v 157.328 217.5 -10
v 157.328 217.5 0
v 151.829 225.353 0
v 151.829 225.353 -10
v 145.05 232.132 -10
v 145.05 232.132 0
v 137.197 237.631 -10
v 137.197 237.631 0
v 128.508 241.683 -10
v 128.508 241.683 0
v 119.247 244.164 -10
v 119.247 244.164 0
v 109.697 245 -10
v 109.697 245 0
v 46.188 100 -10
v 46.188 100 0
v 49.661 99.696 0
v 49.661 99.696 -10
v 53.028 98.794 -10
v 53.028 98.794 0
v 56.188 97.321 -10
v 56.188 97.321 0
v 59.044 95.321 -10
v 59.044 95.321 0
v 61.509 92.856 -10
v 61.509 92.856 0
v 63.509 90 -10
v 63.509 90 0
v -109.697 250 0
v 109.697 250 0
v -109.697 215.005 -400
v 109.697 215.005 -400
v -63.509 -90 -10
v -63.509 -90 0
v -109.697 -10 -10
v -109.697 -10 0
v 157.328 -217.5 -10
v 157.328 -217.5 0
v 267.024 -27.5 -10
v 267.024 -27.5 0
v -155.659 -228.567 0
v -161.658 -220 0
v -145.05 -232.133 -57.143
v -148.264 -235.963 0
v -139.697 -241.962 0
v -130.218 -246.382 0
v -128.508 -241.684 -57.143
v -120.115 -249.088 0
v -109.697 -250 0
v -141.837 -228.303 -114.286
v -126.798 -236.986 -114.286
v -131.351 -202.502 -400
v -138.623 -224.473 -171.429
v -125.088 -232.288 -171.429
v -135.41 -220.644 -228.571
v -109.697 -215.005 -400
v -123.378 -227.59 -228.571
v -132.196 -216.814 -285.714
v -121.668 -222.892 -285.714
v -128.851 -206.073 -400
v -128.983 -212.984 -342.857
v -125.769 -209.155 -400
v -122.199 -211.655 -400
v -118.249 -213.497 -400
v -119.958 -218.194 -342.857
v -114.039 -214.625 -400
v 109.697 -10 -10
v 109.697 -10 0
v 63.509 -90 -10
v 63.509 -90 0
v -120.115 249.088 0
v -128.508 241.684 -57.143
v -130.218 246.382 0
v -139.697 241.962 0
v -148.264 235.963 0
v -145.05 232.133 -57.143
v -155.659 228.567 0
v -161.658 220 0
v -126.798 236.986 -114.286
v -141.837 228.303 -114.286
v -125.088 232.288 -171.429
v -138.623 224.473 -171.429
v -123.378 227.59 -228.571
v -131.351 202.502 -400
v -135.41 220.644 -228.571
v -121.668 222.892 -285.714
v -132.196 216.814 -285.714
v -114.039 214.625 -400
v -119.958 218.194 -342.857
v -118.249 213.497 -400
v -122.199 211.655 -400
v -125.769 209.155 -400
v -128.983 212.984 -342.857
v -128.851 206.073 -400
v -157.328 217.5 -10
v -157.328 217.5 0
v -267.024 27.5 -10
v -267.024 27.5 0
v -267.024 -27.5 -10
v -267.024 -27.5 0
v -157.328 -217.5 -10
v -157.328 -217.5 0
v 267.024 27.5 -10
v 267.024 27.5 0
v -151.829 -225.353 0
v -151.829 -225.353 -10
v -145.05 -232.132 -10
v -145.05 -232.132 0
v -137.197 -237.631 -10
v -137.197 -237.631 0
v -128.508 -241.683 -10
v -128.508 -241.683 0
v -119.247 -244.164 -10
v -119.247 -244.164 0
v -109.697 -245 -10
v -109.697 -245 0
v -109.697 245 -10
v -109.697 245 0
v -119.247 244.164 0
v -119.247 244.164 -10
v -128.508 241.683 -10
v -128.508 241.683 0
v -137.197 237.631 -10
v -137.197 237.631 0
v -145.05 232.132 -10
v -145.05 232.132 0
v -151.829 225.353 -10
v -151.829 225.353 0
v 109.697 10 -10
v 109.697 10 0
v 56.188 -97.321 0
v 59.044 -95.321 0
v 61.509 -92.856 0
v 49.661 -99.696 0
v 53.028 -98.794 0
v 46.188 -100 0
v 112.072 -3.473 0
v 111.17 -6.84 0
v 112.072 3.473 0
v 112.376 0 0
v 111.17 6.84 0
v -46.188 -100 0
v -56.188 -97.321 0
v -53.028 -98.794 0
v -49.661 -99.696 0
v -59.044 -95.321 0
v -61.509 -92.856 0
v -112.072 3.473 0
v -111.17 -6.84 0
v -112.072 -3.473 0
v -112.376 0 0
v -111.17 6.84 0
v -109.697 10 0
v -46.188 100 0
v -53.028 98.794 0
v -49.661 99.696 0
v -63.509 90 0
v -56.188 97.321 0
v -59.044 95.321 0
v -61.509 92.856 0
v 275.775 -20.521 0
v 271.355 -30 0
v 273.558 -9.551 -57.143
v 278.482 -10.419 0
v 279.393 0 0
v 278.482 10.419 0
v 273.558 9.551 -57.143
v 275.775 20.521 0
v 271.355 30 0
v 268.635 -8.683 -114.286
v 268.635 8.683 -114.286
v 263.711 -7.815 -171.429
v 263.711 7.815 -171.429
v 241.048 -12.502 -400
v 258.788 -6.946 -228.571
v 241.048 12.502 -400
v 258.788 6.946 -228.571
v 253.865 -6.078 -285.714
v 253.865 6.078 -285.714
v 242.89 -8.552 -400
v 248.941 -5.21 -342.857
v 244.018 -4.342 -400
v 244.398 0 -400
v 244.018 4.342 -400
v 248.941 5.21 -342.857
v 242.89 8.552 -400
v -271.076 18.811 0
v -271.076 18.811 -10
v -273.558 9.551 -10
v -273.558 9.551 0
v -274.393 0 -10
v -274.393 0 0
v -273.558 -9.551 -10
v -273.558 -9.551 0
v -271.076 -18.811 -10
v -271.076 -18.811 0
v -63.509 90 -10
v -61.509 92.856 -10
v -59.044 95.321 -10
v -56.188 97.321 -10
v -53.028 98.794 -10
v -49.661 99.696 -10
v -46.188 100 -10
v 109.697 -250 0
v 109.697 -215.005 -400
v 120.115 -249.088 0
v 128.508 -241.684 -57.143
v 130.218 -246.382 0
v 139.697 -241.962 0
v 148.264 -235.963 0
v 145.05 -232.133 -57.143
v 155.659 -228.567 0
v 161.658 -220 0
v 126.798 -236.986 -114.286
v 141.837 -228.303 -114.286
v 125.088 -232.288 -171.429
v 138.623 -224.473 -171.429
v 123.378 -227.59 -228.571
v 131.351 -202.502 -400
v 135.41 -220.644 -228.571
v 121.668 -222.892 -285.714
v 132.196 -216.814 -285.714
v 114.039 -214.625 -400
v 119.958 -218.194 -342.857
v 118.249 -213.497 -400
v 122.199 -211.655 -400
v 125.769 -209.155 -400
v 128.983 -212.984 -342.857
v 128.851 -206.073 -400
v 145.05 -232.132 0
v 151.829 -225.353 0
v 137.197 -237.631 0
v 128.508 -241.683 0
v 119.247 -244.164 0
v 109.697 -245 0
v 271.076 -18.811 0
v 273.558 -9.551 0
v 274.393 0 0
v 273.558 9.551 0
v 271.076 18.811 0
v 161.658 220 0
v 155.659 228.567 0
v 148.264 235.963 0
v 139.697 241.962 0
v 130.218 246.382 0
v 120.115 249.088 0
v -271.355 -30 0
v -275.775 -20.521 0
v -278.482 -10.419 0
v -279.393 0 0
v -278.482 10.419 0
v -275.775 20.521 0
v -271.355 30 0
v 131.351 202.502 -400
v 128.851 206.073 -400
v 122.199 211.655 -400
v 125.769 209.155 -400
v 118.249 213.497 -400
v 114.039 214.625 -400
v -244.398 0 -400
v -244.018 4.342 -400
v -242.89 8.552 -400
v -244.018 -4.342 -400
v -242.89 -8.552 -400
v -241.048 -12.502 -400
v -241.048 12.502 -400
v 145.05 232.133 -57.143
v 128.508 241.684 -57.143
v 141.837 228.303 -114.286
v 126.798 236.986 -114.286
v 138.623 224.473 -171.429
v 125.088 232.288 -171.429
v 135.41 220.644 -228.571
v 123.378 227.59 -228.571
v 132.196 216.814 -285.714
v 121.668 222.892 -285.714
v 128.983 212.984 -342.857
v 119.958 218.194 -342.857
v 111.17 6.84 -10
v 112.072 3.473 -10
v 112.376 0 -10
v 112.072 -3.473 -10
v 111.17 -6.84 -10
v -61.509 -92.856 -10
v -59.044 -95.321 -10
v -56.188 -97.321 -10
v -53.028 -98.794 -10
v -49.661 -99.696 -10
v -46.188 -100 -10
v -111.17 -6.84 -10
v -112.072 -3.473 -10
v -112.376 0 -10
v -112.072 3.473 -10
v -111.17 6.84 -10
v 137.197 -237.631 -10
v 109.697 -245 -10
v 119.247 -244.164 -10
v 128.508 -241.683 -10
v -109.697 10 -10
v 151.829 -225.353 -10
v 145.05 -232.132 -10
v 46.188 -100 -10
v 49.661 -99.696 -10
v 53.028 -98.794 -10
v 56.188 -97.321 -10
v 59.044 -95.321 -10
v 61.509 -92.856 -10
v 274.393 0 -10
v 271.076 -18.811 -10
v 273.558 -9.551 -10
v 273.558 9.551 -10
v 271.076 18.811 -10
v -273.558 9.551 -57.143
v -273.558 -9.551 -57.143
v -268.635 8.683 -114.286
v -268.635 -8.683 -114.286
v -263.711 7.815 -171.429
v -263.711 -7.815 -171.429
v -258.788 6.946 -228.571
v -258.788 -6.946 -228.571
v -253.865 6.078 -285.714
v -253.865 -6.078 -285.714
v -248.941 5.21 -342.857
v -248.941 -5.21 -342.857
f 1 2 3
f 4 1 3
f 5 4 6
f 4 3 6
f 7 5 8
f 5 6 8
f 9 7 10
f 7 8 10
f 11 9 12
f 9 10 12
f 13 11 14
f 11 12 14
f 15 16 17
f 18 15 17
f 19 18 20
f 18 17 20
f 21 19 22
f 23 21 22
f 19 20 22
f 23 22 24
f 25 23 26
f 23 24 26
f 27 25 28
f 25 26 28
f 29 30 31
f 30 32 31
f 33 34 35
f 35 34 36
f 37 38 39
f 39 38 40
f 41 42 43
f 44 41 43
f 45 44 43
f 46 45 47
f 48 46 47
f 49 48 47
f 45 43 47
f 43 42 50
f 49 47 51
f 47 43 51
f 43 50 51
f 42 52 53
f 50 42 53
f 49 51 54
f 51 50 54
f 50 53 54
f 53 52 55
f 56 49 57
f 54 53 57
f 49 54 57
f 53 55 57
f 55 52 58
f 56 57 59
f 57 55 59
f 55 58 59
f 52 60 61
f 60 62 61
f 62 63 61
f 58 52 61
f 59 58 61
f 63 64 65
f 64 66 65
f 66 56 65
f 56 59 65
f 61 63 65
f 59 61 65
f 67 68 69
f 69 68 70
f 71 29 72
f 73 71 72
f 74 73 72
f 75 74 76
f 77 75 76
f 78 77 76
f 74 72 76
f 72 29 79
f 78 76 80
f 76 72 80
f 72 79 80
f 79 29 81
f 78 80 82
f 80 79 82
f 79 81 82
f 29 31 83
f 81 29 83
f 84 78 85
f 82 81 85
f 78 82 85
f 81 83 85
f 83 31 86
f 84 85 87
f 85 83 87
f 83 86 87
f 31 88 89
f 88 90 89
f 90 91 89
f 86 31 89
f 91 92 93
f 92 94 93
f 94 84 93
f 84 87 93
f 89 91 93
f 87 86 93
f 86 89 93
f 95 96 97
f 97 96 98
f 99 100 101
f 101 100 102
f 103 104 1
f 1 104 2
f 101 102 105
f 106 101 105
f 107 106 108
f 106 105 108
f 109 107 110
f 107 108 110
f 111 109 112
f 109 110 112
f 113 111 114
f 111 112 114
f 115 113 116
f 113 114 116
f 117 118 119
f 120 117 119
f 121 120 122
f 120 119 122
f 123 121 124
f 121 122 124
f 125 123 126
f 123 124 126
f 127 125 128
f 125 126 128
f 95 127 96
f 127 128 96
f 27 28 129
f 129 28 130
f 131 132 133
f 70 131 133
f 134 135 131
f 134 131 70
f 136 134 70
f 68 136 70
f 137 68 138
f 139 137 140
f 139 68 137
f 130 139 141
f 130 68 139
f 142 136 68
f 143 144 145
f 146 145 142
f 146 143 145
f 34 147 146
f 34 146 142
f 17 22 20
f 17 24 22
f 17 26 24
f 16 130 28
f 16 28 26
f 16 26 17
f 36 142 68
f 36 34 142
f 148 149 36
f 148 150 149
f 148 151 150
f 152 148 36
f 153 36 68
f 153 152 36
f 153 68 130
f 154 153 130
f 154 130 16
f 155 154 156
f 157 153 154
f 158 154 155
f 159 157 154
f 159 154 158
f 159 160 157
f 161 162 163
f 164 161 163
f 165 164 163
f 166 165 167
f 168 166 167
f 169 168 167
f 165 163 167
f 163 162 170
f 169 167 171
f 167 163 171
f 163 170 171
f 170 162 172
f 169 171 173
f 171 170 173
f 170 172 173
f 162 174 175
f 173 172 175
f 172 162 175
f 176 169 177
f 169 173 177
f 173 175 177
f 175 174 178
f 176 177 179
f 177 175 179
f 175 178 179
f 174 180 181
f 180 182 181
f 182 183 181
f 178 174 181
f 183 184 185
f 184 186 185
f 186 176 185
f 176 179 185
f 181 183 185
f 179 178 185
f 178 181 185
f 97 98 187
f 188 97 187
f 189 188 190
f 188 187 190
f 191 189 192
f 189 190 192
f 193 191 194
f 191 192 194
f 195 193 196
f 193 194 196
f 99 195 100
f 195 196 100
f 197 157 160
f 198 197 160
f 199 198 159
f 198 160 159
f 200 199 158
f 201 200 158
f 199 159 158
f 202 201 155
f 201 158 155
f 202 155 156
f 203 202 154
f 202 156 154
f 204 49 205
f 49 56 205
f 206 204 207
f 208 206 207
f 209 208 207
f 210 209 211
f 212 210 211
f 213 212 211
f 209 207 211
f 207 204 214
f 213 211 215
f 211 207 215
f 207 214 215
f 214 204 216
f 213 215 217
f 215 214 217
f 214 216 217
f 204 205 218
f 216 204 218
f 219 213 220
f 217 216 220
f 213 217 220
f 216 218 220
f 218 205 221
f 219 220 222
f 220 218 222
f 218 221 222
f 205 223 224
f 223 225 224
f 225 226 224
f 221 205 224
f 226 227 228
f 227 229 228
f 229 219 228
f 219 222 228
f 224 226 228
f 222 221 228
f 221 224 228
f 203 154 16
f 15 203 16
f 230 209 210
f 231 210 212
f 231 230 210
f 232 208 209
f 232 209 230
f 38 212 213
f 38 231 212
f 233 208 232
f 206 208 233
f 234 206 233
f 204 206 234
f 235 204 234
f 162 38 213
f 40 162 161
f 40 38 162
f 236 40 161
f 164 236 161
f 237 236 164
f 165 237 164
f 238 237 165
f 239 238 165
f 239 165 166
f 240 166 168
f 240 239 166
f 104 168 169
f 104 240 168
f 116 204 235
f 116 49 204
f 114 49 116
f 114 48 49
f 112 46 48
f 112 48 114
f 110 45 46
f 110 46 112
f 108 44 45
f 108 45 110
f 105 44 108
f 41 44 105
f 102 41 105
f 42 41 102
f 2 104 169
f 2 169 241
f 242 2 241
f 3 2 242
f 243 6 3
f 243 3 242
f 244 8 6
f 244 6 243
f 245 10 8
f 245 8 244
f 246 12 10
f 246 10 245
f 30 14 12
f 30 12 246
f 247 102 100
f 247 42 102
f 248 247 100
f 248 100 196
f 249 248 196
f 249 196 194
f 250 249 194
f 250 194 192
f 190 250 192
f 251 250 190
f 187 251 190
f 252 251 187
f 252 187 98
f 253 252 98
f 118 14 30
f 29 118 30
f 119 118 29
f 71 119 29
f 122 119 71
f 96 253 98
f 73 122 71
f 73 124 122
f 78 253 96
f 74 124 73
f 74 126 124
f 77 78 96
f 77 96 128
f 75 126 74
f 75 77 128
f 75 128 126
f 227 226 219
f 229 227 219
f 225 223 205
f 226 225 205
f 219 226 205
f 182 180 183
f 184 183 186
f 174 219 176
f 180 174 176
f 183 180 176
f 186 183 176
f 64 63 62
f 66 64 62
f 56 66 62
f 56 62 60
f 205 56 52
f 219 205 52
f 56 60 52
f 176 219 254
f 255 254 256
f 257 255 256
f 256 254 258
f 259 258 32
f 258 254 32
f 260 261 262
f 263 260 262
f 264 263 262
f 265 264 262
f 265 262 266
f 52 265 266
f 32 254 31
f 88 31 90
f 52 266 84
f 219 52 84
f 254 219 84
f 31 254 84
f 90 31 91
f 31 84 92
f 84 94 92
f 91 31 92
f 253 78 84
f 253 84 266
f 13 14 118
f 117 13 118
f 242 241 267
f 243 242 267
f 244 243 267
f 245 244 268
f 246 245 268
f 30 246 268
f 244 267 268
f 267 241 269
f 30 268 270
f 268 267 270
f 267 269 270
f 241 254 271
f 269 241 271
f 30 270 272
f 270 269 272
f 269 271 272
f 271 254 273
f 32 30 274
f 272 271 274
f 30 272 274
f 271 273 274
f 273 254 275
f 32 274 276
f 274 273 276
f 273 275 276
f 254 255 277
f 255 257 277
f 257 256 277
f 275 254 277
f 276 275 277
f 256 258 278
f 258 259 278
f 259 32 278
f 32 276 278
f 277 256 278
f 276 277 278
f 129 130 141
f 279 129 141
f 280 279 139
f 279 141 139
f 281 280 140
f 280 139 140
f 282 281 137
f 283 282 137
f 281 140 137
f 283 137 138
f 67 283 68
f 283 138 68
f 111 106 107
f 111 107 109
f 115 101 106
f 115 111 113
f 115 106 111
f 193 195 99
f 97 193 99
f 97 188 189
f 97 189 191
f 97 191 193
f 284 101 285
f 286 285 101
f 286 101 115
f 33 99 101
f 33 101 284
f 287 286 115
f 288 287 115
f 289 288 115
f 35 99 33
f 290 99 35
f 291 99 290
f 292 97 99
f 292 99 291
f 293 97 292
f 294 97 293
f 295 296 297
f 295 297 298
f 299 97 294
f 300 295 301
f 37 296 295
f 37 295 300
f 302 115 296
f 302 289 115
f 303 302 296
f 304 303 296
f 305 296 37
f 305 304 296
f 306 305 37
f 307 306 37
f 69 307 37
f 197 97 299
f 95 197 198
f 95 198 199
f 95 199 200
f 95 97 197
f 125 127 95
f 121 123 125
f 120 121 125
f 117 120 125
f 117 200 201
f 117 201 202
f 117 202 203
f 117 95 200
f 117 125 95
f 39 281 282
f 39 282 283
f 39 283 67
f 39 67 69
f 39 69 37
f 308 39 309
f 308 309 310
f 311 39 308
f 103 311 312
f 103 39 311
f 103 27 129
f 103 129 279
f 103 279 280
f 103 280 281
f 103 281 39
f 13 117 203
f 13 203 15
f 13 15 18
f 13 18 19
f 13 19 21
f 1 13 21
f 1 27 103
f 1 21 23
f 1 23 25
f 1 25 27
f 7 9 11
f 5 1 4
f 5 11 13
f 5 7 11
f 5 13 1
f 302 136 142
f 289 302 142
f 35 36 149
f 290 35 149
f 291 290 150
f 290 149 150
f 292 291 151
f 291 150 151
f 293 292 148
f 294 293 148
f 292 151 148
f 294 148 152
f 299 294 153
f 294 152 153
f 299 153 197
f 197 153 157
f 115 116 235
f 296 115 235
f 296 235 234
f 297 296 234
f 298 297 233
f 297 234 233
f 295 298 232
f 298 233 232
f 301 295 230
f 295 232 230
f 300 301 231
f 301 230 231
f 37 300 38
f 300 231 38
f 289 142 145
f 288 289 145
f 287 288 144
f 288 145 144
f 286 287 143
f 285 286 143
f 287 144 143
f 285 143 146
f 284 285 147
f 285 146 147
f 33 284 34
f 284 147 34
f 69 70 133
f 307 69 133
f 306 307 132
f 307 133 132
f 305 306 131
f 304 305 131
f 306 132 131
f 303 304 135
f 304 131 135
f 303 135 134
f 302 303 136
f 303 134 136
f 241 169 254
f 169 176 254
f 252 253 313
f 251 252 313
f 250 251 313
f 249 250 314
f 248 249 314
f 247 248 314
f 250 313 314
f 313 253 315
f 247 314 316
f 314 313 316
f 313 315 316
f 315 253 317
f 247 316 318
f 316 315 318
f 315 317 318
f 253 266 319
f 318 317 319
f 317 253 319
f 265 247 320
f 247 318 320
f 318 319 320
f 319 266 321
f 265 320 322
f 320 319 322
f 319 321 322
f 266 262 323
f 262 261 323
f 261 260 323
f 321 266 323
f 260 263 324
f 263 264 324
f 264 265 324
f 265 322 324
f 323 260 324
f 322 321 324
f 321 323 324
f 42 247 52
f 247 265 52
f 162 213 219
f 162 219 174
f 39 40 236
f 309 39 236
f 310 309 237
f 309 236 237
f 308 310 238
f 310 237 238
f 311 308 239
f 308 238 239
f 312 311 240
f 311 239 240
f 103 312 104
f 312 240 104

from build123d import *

# Parameters (mm, degrees)
F1_DEPTH = 400
F1_TAPER = 5
F2_DEPTH = 10


with BuildPart() as f1:
    # F0 (on Top) → F1 (new body)
    with BuildSketch(Plane.XY):
        with BuildLine():
            Line((109.696551146, 250), (-109.696551146, 250))
            ThreePointArc((-109.696551146, 250), (-139.696551146, 241.9615242271), (-161.6580753731, 220))
            Line((-161.6580753731, 220), (-271.3546265191, 30))
            ThreePointArc((-271.3546265191, 30), (-279.3931022921, 0), (-271.3546265191, -30))
            Line((-271.3546265191, -30), (-161.6580753731, -220))
            ThreePointArc((-161.6580753731, -220), (-139.696551146, -241.9615242271), (-109.696551146, -250))
            Line((-109.696551146, -250), (109.696551146, -250))
            ThreePointArc((109.696551146, -250), (139.696551146, -241.9615242271), (161.6580753731, -220))
            Line((161.6580753731, -220), (271.3546265191, -30))
            ThreePointArc((271.3546265191, -30), (279.3931022921, 0), (271.3546265191, 30))
            Line((271.3546265191, 30), (161.6580753731, 220))
            ThreePointArc((161.6580753731, 220), (139.696551146, 241.9615242271), (109.696551146, 250))
        make_face()
        with BuildLine():
            ThreePointArc((-109.696551146, -244.9999966036), (-137.1965494478, -237.6313942668), (-157.3279454128, -217.4999983018))
            Line((-157.3279454128, -217.4999983018), (-267.0244965589, -27.4999983018))
            ThreePointArc((-267.0244965589, -27.4999983018), (-274.3930988957, 0), (-267.0244965589, 27.4999983018))
            Line((-267.0244965589, 27.4999983018), (-157.3279454128, 217.4999983018))
            ThreePointArc((-157.3279454128, 217.4999983018), (-137.1965494478, 237.6313942668), (-109.696551146, 244.9999966036))
            Line((-109.696551146, 244.9999966036), (109.696551146, 244.9999966036))
            ThreePointArc((109.696551146, 244.9999966036), (137.1965494478, 237.6313942668), (157.3279454128, 217.4999983018))
            Line((157.3279454128, 217.4999983018), (267.0244965589, 27.4999983018))
            ThreePointArc((267.0244965589, 27.4999983018), (274.3930988957, 0), (267.0244965589, -27.4999983018))
            Line((267.0244965589, -27.4999983018), (157.3279454128, -217.4999983018))
            ThreePointArc((157.3279454128, -217.4999983018), (137.1965494478, -237.6313942668), (109.696551146, -244.9999966036))
            Line((109.696551146, -244.9999966036), (-109.696551146, -244.9999966036))
        make_face(mode=Mode.SUBTRACT)
        with BuildLine():
            Line((-267.0244965589, -27.4999983018), (-157.3279454128, -217.4999983018))
            ThreePointArc((-157.3279454128, -217.4999983018), (-137.1965494478, -237.6313942668), (-109.696551146, -244.9999966036))
            Line((-109.696551146, -244.9999966036), (109.696551146, -244.9999966036))
            ThreePointArc((109.696551146, -244.9999966036), (137.1965494478, -237.6313942668), (157.3279454128, -217.4999983018))
            Line((157.3279454128, -217.4999983018), (267.0244965589, -27.4999983018))
            ThreePointArc((267.0244965589, -27.4999983018), (274.3930988957, 0), (267.0244965589, 27.4999983018))
            Line((267.0244965589, 27.4999983018), (157.3279454128, 217.4999983018))
            ThreePointArc((157.3279454128, 217.4999983018), (137.1965494478, 237.6313942668), (109.696551146, 244.9999966036))
            Line((109.696551146, 244.9999966036), (-109.696551146, 244.9999966036))
            ThreePointArc((-109.696551146, 244.9999966036), (-137.1965494478, 237.6313942668), (-157.3279454128, 217.4999983018))
            Line((-157.3279454128, 217.4999983018), (-267.0244965589, 27.4999983018))
            ThreePointArc((-267.0244965589, 27.4999983018), (-274.3930988957, 0), (-267.0244965589, -27.4999983018))
        make_face()
        with BuildLine():
            ThreePointArc((-63.5085296109, 90), (-56.1880215352, 97.3205080757), (-46.1880215352, 100))
            Line((-46.1880215352, 100), (46.1880215352, 100))
            ThreePointArc((46.1880215352, 100), (56.1880215352, 97.3205080757), (63.5085296109, 90))
            Line((63.5085296109, 90), (109.696551146, 10))
            ThreePointArc((109.696551146, 10), (112.3760430703, 0), (109.696551146, -10))
            Line((109.696551146, -10), (63.5085296109, -90))
            ThreePointArc((63.5085296109, -90), (56.1880215352, -97.3205080757), (46.1880215352, -100))
            Line((46.1880215352, -100), (-46.1880215352, -100))
            ThreePointArc((-46.1880215352, -100), (-56.1880215352, -97.3205080757), (-63.5085296109, -90))
            Line((-63.5085296109, -90), (-109.696551146, -10))
            ThreePointArc((-109.696551146, -10), (-112.3760430703, 0), (-109.696551146, 10))
            Line((-109.696551146, 10), (-63.5085296109, 90))
        make_face(mode=Mode.SUBTRACT)
        with BuildLine():
            Line((46.1880215352, 100), (-46.1880215352, 100))
            ThreePointArc((-46.1880215352, 100), (-56.1880215352, 97.3205080757), (-63.5085296109, 90))
            Line((-63.5085296109, 90), (-109.696551146, 10))
            ThreePointArc((-109.696551146, 10), (-112.3760430703, 0), (-109.696551146, -10))
            Line((-109.696551146, -10), (-63.5085296109, -90))
            ThreePointArc((-63.5085296109, -90), (-56.1880215352, -97.3205080757), (-46.1880215352, -100))
            Line((-46.1880215352, -100), (46.1880215352, -100))
            ThreePointArc((46.1880215352, -100), (56.1880215352, -97.3205080757), (63.5085296109, -90))
            Line((63.5085296109, -90), (109.696551146, -10))
            ThreePointArc((109.696551146, -10), (112.3760430703, 0), (109.696551146, 10))
            Line((109.696551146, 10), (63.5085296109, 90))
            ThreePointArc((63.5085296109, 90), (56.1880215352, 97.3205080757), (46.1880215352, 100))
        make_face()
    extrude(amount=-F1_DEPTH, taper=F1_TAPER)

    # F0 (on Top) → F2 (cut)
    with BuildSketch(Plane.XY):
        with BuildLine():
            Line((-267.0244965589, -27.4999983018), (-157.3279454128, -217.4999983018))
            ThreePointArc((-157.3279454128, -217.4999983018), (-137.1965494478, -237.6313942668), (-109.696551146, -244.9999966036))
            Line((-109.696551146, -244.9999966036), (109.696551146, -244.9999966036))
            ThreePointArc((109.696551146, -244.9999966036), (137.1965494478, -237.6313942668), (157.3279454128, -217.4999983018))
            Line((157.3279454128, -217.4999983018), (267.0244965589, -27.4999983018))
            ThreePointArc((267.0244965589, -27.4999983018), (274.3930988957, 0), (267.0244965589, 27.4999983018))
            Line((267.0244965589, 27.4999983018), (157.3279454128, 217.4999983018))
            ThreePointArc((157.3279454128, 217.4999983018), (137.1965494478, 237.6313942668), (109.696551146, 244.9999966036))
            Line((109.696551146, 244.9999966036), (-109.696551146, 244.9999966036))
            ThreePointArc((-109.696551146, 244.9999966036), (-137.1965494478, 237.6313942668), (-157.3279454128, 217.4999983018))
            Line((-157.3279454128, 217.4999983018), (-267.0244965589, 27.4999983018))
            ThreePointArc((-267.0244965589, 27.4999983018), (-274.3930988957, 0), (-267.0244965589, -27.4999983018))
        make_face()
        with BuildLine():
            ThreePointArc((-63.5085296109, 90), (-56.1880215352, 97.3205080757), (-46.1880215352, 100))
            Line((-46.1880215352, 100), (46.1880215352, 100))
            ThreePointArc((46.1880215352, 100), (56.1880215352, 97.3205080757), (63.5085296109, 90))
            Line((63.5085296109, 90), (109.696551146, 10))
            ThreePointArc((109.696551146, 10), (112.3760430703, 0), (109.696551146, -10))
            Line((109.696551146, -10), (63.5085296109, -90))
            ThreePointArc((63.5085296109, -90), (56.1880215352, -97.3205080757), (46.1880215352, -100))
            Line((46.1880215352, -100), (-46.1880215352, -100))
            ThreePointArc((-46.1880215352, -100), (-56.1880215352, -97.3205080757), (-63.5085296109, -90))
            Line((-63.5085296109, -90), (-109.696551146, -10))
            ThreePointArc((-109.696551146, -10), (-112.3760430703, 0), (-109.696551146, 10))
            Line((-109.696551146, 10), (-63.5085296109, 90))
        make_face(mode=Mode.SUBTRACT)
    extrude(amount=-F2_DEPTH, mode=Mode.SUBTRACT)


solid = f1.part
